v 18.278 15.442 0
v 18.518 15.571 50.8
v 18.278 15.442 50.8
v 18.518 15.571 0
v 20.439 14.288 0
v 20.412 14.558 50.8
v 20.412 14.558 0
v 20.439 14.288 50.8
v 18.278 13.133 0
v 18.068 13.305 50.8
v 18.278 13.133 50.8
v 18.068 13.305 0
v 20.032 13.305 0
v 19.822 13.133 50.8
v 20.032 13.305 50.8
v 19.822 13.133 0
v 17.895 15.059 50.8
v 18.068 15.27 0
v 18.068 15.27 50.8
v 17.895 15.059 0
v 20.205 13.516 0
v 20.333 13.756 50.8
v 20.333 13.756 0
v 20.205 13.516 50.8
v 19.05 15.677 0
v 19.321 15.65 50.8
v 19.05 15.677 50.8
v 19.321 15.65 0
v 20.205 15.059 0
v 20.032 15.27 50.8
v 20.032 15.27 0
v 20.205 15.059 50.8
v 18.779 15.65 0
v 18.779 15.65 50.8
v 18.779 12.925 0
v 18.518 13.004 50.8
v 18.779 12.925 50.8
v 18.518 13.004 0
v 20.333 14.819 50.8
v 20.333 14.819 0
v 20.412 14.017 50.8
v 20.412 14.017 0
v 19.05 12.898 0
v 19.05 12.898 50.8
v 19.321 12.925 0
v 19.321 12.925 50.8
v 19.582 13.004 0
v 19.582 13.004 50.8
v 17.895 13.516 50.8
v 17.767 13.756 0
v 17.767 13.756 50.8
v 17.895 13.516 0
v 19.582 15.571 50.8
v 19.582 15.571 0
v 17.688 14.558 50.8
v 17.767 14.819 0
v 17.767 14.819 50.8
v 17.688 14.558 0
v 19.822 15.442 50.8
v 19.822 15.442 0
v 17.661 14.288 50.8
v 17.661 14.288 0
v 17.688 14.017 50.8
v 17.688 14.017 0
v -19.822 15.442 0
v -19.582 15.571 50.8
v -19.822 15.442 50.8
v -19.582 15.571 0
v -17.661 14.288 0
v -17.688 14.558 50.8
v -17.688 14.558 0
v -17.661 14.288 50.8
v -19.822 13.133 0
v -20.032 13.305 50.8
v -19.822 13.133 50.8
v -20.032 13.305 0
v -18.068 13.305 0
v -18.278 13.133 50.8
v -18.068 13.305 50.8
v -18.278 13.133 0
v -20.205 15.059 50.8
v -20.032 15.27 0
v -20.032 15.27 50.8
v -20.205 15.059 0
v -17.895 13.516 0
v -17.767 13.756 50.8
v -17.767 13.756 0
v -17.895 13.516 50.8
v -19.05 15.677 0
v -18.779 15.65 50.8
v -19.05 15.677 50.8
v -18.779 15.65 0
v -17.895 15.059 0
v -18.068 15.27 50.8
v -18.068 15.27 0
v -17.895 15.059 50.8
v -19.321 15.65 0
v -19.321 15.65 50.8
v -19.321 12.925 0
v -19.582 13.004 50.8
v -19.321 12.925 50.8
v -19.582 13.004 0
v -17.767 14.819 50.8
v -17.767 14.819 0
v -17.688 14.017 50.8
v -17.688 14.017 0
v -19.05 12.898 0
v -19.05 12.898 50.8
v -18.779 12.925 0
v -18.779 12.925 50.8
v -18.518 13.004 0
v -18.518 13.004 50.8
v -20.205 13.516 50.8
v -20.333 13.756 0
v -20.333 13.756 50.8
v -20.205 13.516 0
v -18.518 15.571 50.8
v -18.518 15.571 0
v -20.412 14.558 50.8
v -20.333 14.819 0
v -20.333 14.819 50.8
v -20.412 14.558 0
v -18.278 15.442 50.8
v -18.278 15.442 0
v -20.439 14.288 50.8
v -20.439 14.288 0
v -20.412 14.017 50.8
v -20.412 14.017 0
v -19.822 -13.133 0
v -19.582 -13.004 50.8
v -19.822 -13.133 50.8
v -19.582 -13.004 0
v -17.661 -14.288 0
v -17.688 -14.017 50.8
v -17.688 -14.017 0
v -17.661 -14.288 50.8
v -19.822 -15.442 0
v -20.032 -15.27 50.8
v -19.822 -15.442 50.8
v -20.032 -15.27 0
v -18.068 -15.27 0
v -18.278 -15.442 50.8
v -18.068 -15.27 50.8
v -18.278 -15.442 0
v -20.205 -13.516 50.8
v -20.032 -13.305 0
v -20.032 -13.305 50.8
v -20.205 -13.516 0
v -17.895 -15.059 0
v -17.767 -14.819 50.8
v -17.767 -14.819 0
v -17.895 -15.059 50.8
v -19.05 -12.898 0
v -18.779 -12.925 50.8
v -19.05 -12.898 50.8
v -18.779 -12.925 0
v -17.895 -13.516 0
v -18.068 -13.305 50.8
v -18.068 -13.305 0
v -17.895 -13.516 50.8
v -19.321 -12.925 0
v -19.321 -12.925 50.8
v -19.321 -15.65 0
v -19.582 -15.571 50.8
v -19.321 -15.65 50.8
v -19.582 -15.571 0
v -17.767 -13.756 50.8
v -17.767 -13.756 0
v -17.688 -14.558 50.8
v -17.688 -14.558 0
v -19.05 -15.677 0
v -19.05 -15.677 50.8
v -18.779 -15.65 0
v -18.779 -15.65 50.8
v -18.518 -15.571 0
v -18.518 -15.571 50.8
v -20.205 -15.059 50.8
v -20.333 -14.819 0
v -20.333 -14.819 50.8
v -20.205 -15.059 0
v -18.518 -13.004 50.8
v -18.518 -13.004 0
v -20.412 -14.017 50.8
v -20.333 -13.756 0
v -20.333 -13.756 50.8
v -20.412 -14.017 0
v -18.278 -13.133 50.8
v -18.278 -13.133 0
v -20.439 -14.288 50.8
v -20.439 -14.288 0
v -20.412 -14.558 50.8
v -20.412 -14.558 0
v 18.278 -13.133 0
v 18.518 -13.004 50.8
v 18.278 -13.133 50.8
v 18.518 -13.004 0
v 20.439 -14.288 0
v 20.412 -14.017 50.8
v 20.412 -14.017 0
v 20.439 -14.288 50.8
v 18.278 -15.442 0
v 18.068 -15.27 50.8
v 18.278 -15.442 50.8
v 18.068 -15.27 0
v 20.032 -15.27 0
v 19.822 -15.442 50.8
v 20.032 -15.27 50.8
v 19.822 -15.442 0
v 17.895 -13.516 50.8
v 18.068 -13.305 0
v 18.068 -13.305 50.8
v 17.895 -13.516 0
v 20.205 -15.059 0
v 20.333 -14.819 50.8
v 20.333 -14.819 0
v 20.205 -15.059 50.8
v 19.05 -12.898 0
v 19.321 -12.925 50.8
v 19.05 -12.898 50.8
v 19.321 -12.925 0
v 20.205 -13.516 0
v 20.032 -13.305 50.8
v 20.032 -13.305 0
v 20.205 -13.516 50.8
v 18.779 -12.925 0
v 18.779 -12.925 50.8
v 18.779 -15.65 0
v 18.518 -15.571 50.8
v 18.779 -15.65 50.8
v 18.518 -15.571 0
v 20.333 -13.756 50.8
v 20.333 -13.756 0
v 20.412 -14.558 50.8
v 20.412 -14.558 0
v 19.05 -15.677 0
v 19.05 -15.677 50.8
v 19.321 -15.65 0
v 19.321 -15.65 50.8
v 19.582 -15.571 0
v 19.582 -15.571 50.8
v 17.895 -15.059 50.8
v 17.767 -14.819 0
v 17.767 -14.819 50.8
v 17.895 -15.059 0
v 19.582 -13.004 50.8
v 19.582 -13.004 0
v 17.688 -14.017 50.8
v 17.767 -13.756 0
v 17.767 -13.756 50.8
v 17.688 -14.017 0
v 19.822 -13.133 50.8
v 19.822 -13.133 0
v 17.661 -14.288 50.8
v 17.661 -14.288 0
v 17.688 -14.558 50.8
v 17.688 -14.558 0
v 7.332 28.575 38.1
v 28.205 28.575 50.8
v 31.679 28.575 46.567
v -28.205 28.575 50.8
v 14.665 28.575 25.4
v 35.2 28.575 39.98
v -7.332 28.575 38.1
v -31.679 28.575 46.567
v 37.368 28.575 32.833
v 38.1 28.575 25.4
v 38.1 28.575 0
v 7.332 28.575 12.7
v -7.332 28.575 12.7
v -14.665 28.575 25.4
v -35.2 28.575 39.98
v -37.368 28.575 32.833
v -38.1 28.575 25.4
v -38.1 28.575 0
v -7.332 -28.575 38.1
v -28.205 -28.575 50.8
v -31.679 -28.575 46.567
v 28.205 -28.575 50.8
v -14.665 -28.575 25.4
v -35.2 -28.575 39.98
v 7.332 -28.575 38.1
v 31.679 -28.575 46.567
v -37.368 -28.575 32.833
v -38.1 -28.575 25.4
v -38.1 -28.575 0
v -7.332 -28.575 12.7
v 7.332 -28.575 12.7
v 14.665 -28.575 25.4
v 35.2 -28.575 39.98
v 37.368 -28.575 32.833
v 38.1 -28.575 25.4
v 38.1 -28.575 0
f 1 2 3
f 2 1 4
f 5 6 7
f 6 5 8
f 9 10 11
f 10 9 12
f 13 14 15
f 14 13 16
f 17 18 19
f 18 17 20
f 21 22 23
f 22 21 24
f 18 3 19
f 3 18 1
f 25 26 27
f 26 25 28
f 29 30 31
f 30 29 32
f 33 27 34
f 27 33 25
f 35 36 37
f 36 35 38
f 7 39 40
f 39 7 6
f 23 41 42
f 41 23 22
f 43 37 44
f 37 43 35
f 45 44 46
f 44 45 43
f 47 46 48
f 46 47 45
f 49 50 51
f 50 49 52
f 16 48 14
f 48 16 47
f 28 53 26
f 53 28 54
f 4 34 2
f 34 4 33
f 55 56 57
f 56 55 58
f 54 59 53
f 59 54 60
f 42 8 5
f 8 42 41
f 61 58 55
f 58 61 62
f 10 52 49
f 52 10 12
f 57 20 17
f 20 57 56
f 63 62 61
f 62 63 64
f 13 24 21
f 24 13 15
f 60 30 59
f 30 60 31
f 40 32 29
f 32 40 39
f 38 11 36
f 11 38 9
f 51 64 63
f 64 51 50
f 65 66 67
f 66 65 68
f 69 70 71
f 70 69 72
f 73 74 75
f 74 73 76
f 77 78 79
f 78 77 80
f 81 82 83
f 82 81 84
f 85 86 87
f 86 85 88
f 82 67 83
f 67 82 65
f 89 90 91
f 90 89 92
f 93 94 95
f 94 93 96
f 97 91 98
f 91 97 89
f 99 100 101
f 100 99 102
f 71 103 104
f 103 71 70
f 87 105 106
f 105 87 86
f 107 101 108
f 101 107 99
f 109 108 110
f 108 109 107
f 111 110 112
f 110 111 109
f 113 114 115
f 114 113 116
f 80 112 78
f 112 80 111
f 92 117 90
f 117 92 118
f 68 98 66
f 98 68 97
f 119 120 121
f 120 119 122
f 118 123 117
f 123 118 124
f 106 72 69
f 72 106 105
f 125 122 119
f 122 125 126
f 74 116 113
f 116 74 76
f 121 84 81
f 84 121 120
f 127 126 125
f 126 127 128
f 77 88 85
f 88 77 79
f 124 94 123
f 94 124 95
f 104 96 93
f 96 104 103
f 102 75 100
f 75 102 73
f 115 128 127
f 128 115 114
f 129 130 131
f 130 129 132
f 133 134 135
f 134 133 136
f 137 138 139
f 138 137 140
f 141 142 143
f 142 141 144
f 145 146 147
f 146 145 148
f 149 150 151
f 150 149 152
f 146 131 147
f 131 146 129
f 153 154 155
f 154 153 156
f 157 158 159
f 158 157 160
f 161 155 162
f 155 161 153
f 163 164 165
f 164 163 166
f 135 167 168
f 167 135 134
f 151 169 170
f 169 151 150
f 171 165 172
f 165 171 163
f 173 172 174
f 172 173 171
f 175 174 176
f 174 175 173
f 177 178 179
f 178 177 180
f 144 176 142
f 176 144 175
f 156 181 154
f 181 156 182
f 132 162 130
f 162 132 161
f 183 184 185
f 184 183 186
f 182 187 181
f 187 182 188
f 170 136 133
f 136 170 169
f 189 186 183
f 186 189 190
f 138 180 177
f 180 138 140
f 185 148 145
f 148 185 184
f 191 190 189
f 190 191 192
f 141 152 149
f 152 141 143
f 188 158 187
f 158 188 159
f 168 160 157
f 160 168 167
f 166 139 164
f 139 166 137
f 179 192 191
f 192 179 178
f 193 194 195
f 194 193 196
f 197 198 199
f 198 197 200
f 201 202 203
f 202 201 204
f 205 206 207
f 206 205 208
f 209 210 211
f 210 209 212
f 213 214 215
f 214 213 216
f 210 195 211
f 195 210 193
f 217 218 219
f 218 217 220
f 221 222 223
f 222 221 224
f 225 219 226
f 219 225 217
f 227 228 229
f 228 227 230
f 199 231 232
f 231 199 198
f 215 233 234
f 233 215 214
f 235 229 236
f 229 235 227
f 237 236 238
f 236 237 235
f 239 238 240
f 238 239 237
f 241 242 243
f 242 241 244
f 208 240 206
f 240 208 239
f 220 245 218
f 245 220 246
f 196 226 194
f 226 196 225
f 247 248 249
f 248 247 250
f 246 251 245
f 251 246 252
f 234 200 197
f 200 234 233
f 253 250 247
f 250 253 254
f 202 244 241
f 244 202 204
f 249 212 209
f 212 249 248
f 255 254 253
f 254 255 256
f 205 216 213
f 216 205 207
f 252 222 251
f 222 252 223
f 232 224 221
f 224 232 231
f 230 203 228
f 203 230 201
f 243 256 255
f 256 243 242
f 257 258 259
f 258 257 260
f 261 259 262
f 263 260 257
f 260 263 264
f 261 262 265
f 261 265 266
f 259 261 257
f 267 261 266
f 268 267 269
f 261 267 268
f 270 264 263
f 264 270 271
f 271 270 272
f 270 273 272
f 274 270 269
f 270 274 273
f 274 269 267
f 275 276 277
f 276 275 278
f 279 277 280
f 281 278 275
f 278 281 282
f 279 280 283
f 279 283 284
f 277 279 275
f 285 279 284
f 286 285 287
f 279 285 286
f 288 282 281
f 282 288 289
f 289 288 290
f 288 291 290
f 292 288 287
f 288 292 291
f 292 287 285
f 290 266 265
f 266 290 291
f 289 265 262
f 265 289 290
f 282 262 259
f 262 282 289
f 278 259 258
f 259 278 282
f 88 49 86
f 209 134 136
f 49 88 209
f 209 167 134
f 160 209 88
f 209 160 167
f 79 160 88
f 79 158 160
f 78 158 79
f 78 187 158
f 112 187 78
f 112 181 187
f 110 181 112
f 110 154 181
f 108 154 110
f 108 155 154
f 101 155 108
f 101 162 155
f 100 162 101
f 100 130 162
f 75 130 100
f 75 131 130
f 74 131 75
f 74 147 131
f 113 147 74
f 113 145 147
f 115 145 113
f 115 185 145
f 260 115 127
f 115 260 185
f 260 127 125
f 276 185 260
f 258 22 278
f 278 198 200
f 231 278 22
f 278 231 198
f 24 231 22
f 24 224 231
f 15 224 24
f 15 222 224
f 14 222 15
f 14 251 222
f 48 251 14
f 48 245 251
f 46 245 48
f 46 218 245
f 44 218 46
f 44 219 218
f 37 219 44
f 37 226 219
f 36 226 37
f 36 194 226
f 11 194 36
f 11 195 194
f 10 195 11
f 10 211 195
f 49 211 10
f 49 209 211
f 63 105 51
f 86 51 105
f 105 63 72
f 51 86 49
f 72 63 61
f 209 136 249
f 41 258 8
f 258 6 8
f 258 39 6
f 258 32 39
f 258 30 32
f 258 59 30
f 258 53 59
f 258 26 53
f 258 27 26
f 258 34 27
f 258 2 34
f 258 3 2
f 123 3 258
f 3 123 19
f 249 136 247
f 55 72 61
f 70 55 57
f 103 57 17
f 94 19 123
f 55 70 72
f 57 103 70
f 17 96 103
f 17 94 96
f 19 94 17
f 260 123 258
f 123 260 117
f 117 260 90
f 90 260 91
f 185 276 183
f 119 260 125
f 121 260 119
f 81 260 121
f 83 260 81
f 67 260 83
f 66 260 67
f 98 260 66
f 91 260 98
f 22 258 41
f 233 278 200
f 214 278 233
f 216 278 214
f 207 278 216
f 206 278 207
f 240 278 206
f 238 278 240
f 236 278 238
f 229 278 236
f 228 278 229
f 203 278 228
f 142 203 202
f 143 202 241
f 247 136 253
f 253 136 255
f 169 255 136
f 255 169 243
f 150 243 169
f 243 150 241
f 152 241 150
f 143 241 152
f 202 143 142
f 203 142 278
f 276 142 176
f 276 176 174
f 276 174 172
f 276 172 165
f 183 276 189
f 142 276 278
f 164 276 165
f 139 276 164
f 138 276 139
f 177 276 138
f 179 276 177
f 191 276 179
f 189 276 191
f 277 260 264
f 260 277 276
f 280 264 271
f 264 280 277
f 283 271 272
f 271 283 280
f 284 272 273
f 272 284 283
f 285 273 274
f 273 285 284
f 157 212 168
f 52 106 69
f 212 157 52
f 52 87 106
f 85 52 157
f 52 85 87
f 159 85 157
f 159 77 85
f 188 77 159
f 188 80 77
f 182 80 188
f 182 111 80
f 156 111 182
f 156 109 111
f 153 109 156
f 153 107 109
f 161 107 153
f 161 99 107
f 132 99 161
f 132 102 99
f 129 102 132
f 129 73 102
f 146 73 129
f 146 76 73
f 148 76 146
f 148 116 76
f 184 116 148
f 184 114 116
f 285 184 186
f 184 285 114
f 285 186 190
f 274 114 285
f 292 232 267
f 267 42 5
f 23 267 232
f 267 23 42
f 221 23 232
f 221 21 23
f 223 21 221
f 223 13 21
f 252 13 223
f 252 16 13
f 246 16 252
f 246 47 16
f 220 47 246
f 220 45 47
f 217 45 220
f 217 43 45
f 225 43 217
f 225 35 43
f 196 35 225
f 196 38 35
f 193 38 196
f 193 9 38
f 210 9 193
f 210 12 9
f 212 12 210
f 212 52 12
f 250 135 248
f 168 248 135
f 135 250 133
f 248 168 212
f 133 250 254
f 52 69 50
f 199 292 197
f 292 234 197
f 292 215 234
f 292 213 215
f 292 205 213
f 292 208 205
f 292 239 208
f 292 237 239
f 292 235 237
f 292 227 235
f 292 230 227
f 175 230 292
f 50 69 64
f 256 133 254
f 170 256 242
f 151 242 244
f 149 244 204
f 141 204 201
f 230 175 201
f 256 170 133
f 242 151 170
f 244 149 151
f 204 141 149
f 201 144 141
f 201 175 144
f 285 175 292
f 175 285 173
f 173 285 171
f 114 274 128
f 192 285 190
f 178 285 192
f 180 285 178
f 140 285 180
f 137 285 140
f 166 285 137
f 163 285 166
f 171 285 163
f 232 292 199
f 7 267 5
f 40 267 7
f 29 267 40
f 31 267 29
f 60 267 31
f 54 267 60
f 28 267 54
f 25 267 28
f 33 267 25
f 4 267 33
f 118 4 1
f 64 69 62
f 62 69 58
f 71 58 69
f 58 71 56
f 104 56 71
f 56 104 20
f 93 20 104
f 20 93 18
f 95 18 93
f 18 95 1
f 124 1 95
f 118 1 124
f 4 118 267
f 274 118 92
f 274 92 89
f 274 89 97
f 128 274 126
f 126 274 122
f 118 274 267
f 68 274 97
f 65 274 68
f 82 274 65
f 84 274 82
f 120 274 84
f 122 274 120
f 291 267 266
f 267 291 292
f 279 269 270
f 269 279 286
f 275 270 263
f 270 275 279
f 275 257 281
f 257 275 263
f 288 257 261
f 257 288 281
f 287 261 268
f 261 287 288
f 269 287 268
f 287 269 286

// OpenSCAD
// file: configuration/configuration_ryobi_p508.scad
/* [Saw] */
SAW_ARBOR_DIAMETER = 0.375;
SAW_ARBOR_THICKNESS = 0.375;
SAW_CUT_DEPTH = 2.4375;
BLADE_DIAMETER = 7.25;
BLADE_TEETH = 60;
BLADE_KERF = 0.063;
BLADE_GUARD_THICKNESS = 0.125;
BLADE_GUARD_DIAMETER = 1.5;
BASE_THICKNESS = 0.25;
BASE_LEFT_WIDTH = 1.25;
BASE_RIGHT_WIDTH = 3.25;
BASE_LENGTH = 13.5;
MOTOR_DIAMETER = 3;
MOTOR_LENGTH = 4.5;
MOTOR_COLOR = "#e2ff00";

/* [Frame] */
PIPE_DIAMETER = 1;
PIPE_THICKNESS = 0.125;
PIPE_LEFT_OFFSET = 3.5;
PIPE_RIGHT_OFFSET = 5.5;
BOARD_WIDTH = 24;
BOARD_LENGTH = 48;
BOARD_THICKNESS = 0.75;
CARRIAGE_THICKNESS = 0.75;
CARRIAGE_LENGTH = 15.5;

/* [Fasteners] */
SCREW_DIAMETER = 0.109375;
SCREW_HEAD_DIAMETER = 0.332;
SCREW_HEAD_HEIGHT = 0.1;

/* [Bushings] */
BUSHING_HEIGHT = 2;
BUSHING_WIDTH = 3;
BUSHING_LENGTH = 2.25;
BUSHING_THICKNESS = 0.5;
// file: materials.scad
module board(length, width, thickness) {
  color("#c19a6b") translate([0, 0, thickness / 2]) cube([length, width, thickness], center=true);
}

module pipe(diameter, length, thickness) {
  color("silver") difference() {
    cylinder(r=diameter / 2, h=length, center=true);
    cylinder(r=diameter / 2 - thickness, h=length + 2, center=true);
  }
}

module socket_screw(diameter, length, head_diameter, head_height) {
  color("silver") {
    mirror([0, 0, 1]) cylinder(r=diameter / 2, h=length);
    cylinder(r=head_diameter / 2, h=head_height);
  }
}

module flat_screw(diameter, length, head_diameter, head_height) {
  color("silver") {
    mirror([0, 0, 1]) cylinder(r=diameter / 2, h=length);
    cylinder(r1=diameter / 2, r2=head_diameter / 2, h=head_height);
  }
}

module nut(diameter, screw_diameter, height) {
  color("silver") difference() {
    cylinder(r=diameter / 2, h=height, center=true, $fn=6);
    cylinder(r=screw_diameter / 2, h=height + 2, center=true);
  }
}
// main file
use <materials.scad>

module bushing(length, width, height, thickness, pipe_diameter, screw_diameter, screw_head_diameter, screw_head_height) {
  color("orange") difference() {
    pipe_offset = pipe_diameter / 2 + thickness - height;
    translate([0, length / 2, -pipe_offset]) rotate([90, 0, 0]) linear_extrude(height=length, convexity=10) difference() {
      translate([0, pipe_offset + height / 2]) {
        intersection() {
          circle(r=max(height, width) / 2);
          square([width, height], center=true);
        }

        translate([0, -height / 4]) square([width, height / 2], center=true);
      }

      // TODO(kjiwa): Consider adding notches for PTFE tubing. See
      // https://www.youtube.com/watch?v=HjRh_Fa9G2I.
      segments = 6;
      inner_diameter = (pipe_diameter / 2) / cos(360 / (2 * segments));
      circle(r=inner_diameter, $fn=segments);
    }

    mirror([0, 0, 1]) {
      screw_length = height * 2;
      translate([width / 4, length / 4, 0]) flat_screw(screw_diameter, screw_length, screw_head_diameter, screw_head_height);
      translate([-width / 4, length / 4, 0]) flat_screw(screw_diameter, screw_length, screw_head_diameter, screw_head_height);
      translate([-width / 4, -length / 4, 0]) flat_screw(screw_diameter, screw_length, screw_head_diameter, screw_head_height);
      translate([width / 4, -length / 4, 0]) flat_screw(screw_diameter, screw_length, screw_head_diameter, screw_head_height);
    }
  }
}

// include <configuration/configuration_makita_5402na.scad>
include <configuration/configuration_ryobi_p508.scad>
// include <configuration/configuration_worx_wx429l.scad>

$fn = 32;
scale(25.4) {
  bushing(BUSHING_LENGTH, BUSHING_WIDTH, BUSHING_HEIGHT, BUSHING_THICKNESS, PIPE_DIAMETER, SCREW_DIAMETER, SCREW_HEAD_DIAMETER, SCREW_HEAD_HEIGHT);
  % translate([0, 0, BUSHING_HEIGHT - BUSHING_THICKNESS - PIPE_DIAMETER / 2]) rotate([90, 0, 0]) pipe(PIPE_DIAMETER, BUSHING_LENGTH * 2, PIPE_THICKNESS);
}
